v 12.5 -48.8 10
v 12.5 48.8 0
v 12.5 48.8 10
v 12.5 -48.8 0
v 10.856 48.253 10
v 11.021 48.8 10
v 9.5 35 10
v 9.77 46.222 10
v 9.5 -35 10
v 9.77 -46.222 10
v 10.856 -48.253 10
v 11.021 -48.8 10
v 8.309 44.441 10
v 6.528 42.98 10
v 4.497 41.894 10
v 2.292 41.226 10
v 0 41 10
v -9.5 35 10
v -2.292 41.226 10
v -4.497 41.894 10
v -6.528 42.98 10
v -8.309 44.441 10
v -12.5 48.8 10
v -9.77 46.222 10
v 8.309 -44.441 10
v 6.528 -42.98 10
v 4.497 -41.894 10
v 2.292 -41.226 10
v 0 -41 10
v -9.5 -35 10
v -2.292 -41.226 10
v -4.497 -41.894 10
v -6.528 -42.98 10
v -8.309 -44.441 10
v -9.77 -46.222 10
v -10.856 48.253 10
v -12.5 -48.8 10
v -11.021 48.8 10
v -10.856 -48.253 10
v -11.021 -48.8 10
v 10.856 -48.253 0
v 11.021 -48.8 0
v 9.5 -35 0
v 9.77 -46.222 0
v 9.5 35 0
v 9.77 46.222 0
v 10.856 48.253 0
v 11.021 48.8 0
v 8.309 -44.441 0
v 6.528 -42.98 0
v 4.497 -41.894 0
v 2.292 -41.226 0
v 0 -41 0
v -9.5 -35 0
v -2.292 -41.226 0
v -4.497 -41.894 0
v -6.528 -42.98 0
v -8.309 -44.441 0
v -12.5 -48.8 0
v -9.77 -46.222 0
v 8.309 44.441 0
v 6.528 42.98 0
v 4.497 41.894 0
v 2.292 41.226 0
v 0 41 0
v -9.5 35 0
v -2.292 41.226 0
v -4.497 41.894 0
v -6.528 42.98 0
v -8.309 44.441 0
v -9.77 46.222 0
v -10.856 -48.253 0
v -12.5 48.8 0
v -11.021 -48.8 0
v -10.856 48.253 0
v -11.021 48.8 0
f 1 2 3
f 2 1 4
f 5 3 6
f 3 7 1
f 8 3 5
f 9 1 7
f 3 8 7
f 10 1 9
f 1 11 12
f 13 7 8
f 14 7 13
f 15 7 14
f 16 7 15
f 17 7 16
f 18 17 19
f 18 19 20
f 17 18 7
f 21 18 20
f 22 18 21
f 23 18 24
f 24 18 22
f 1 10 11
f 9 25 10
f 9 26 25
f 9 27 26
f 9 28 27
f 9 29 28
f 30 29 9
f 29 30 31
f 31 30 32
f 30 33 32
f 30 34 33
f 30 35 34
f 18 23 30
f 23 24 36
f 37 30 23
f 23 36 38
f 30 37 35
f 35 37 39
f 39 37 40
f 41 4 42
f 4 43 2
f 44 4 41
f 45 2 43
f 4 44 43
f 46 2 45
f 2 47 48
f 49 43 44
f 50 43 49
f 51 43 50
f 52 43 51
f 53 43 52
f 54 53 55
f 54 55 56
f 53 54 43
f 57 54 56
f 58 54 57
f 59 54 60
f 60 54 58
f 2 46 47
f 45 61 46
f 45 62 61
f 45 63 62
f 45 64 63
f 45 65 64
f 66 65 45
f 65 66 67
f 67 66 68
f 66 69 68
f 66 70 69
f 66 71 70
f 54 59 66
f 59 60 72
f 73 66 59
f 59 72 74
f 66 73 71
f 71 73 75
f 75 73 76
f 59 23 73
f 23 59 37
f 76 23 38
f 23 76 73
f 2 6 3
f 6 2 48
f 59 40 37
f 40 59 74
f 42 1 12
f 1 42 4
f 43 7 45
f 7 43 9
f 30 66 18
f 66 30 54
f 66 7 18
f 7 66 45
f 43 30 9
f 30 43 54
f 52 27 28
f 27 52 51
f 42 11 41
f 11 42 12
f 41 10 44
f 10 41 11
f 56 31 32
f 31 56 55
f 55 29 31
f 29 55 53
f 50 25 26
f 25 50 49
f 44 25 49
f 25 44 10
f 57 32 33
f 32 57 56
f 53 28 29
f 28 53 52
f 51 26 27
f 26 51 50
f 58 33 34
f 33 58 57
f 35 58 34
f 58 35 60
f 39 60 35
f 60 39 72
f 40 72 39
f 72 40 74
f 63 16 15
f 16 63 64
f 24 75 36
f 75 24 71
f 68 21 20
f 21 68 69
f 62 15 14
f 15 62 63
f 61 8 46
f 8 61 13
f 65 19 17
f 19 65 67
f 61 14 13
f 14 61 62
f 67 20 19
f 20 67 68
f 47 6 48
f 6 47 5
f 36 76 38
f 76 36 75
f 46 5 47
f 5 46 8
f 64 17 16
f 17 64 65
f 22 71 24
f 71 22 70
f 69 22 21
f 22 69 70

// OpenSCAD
//Remix of http://www.thingiverse.com/thing:918871
//Rev2: Revised to use Main dimension between Pipes
//Rev3: Added pull down menu for Pipe diameter
//
//to make it parametric
//CUSTOMIZER VARIABLES

//1. Length Between Pipes (Originally 82mm or 124mm)
Len = 82;               //Original Short Length

//Len=124;              //Original Long Length

//2. Width of Square check
Wid = 25;               //Width of Part

//3. Thickness Between inside cut & pipe cut (original was 17.19mm)
LenCutThk = 6;

//4. Thickness on edges of inside cut
WidCutThk = 3;
//WidCut = 16;          //Width of Inside Cut

//5. Height of Square Check
Ht = 10;                //Height of part

//6. Pipe Dia. to use (Use C-23.5mm, F-25.0mm or J-25.4mm)
PipeDia = 23.5;         //[23.5:C-23.5mm OD, 25.4:F-25.0mm OD, 25.4:J-25.4mm OD]

//6. Cube Offset
CylOffset = 7.8;        //Offset from edge of pipe to end of cube

//7. Resolution of Pipe cut (original was 32)
ires = 32;

//8. Print 1 or 2 Square Checks
Qty = 1;

//CUSTOMIZER VARIABLES END

$fn = ires;                 //Resolution of Pipe Cylinder cut
LenBetweenPipes = Len + (CylOffset * 2);
L2 = LenBetweenPipes / 2;
PipeRad = PipeDia / 2;
echo("L2 = ", L2);
W2 = Wid / 2;
Y_org = (PipeDia / 2) - CylOffset;
echo("Y_org = ", Y_org);
L3 = L2 - Y_org - LenCutThk;
echo("L3 = ", L3);
LenCut2 = (Len / 2) - LenCutThk;
LenCut = LenCut2 * 2;
WidCut = Wid - (WidCutThk *2);
WidCut2 = WidCut / 2;
Cyl_Y = (Len / 2) + PipeRad;

//Draw the Main base for this part
//The main length is along the Y-axis as originally drawn
module Base()
{
    translate([-W2,-L2,0])
    cube([Wid,LenBetweenPipes,Ht]);
}
module SquareCheck()
{
    difference()
    {
        Base();
        translate([-WidCut2,-LenCut2,-1])
        cube([WidCut,LenCut,Ht+2]);         //Cut inside cube out of part
        translate([0,-Cyl_Y,-1])
        cylinder(d=PipeDia,h=Ht+2);         //Cut bottom end for pipe
        translate([0,Cyl_Y,-1])
        cylinder(d=PipeDia,h=Ht+2);         //Cut Top end for pipe
    }
}
SquareCheck();                  //Draw 1st part
if (Qty == 2)
{
    translate([Wid+6,0,0])      //Seperate parts by 6mm
    SquareCheck();              //Maybe draw a 2nd part
}
